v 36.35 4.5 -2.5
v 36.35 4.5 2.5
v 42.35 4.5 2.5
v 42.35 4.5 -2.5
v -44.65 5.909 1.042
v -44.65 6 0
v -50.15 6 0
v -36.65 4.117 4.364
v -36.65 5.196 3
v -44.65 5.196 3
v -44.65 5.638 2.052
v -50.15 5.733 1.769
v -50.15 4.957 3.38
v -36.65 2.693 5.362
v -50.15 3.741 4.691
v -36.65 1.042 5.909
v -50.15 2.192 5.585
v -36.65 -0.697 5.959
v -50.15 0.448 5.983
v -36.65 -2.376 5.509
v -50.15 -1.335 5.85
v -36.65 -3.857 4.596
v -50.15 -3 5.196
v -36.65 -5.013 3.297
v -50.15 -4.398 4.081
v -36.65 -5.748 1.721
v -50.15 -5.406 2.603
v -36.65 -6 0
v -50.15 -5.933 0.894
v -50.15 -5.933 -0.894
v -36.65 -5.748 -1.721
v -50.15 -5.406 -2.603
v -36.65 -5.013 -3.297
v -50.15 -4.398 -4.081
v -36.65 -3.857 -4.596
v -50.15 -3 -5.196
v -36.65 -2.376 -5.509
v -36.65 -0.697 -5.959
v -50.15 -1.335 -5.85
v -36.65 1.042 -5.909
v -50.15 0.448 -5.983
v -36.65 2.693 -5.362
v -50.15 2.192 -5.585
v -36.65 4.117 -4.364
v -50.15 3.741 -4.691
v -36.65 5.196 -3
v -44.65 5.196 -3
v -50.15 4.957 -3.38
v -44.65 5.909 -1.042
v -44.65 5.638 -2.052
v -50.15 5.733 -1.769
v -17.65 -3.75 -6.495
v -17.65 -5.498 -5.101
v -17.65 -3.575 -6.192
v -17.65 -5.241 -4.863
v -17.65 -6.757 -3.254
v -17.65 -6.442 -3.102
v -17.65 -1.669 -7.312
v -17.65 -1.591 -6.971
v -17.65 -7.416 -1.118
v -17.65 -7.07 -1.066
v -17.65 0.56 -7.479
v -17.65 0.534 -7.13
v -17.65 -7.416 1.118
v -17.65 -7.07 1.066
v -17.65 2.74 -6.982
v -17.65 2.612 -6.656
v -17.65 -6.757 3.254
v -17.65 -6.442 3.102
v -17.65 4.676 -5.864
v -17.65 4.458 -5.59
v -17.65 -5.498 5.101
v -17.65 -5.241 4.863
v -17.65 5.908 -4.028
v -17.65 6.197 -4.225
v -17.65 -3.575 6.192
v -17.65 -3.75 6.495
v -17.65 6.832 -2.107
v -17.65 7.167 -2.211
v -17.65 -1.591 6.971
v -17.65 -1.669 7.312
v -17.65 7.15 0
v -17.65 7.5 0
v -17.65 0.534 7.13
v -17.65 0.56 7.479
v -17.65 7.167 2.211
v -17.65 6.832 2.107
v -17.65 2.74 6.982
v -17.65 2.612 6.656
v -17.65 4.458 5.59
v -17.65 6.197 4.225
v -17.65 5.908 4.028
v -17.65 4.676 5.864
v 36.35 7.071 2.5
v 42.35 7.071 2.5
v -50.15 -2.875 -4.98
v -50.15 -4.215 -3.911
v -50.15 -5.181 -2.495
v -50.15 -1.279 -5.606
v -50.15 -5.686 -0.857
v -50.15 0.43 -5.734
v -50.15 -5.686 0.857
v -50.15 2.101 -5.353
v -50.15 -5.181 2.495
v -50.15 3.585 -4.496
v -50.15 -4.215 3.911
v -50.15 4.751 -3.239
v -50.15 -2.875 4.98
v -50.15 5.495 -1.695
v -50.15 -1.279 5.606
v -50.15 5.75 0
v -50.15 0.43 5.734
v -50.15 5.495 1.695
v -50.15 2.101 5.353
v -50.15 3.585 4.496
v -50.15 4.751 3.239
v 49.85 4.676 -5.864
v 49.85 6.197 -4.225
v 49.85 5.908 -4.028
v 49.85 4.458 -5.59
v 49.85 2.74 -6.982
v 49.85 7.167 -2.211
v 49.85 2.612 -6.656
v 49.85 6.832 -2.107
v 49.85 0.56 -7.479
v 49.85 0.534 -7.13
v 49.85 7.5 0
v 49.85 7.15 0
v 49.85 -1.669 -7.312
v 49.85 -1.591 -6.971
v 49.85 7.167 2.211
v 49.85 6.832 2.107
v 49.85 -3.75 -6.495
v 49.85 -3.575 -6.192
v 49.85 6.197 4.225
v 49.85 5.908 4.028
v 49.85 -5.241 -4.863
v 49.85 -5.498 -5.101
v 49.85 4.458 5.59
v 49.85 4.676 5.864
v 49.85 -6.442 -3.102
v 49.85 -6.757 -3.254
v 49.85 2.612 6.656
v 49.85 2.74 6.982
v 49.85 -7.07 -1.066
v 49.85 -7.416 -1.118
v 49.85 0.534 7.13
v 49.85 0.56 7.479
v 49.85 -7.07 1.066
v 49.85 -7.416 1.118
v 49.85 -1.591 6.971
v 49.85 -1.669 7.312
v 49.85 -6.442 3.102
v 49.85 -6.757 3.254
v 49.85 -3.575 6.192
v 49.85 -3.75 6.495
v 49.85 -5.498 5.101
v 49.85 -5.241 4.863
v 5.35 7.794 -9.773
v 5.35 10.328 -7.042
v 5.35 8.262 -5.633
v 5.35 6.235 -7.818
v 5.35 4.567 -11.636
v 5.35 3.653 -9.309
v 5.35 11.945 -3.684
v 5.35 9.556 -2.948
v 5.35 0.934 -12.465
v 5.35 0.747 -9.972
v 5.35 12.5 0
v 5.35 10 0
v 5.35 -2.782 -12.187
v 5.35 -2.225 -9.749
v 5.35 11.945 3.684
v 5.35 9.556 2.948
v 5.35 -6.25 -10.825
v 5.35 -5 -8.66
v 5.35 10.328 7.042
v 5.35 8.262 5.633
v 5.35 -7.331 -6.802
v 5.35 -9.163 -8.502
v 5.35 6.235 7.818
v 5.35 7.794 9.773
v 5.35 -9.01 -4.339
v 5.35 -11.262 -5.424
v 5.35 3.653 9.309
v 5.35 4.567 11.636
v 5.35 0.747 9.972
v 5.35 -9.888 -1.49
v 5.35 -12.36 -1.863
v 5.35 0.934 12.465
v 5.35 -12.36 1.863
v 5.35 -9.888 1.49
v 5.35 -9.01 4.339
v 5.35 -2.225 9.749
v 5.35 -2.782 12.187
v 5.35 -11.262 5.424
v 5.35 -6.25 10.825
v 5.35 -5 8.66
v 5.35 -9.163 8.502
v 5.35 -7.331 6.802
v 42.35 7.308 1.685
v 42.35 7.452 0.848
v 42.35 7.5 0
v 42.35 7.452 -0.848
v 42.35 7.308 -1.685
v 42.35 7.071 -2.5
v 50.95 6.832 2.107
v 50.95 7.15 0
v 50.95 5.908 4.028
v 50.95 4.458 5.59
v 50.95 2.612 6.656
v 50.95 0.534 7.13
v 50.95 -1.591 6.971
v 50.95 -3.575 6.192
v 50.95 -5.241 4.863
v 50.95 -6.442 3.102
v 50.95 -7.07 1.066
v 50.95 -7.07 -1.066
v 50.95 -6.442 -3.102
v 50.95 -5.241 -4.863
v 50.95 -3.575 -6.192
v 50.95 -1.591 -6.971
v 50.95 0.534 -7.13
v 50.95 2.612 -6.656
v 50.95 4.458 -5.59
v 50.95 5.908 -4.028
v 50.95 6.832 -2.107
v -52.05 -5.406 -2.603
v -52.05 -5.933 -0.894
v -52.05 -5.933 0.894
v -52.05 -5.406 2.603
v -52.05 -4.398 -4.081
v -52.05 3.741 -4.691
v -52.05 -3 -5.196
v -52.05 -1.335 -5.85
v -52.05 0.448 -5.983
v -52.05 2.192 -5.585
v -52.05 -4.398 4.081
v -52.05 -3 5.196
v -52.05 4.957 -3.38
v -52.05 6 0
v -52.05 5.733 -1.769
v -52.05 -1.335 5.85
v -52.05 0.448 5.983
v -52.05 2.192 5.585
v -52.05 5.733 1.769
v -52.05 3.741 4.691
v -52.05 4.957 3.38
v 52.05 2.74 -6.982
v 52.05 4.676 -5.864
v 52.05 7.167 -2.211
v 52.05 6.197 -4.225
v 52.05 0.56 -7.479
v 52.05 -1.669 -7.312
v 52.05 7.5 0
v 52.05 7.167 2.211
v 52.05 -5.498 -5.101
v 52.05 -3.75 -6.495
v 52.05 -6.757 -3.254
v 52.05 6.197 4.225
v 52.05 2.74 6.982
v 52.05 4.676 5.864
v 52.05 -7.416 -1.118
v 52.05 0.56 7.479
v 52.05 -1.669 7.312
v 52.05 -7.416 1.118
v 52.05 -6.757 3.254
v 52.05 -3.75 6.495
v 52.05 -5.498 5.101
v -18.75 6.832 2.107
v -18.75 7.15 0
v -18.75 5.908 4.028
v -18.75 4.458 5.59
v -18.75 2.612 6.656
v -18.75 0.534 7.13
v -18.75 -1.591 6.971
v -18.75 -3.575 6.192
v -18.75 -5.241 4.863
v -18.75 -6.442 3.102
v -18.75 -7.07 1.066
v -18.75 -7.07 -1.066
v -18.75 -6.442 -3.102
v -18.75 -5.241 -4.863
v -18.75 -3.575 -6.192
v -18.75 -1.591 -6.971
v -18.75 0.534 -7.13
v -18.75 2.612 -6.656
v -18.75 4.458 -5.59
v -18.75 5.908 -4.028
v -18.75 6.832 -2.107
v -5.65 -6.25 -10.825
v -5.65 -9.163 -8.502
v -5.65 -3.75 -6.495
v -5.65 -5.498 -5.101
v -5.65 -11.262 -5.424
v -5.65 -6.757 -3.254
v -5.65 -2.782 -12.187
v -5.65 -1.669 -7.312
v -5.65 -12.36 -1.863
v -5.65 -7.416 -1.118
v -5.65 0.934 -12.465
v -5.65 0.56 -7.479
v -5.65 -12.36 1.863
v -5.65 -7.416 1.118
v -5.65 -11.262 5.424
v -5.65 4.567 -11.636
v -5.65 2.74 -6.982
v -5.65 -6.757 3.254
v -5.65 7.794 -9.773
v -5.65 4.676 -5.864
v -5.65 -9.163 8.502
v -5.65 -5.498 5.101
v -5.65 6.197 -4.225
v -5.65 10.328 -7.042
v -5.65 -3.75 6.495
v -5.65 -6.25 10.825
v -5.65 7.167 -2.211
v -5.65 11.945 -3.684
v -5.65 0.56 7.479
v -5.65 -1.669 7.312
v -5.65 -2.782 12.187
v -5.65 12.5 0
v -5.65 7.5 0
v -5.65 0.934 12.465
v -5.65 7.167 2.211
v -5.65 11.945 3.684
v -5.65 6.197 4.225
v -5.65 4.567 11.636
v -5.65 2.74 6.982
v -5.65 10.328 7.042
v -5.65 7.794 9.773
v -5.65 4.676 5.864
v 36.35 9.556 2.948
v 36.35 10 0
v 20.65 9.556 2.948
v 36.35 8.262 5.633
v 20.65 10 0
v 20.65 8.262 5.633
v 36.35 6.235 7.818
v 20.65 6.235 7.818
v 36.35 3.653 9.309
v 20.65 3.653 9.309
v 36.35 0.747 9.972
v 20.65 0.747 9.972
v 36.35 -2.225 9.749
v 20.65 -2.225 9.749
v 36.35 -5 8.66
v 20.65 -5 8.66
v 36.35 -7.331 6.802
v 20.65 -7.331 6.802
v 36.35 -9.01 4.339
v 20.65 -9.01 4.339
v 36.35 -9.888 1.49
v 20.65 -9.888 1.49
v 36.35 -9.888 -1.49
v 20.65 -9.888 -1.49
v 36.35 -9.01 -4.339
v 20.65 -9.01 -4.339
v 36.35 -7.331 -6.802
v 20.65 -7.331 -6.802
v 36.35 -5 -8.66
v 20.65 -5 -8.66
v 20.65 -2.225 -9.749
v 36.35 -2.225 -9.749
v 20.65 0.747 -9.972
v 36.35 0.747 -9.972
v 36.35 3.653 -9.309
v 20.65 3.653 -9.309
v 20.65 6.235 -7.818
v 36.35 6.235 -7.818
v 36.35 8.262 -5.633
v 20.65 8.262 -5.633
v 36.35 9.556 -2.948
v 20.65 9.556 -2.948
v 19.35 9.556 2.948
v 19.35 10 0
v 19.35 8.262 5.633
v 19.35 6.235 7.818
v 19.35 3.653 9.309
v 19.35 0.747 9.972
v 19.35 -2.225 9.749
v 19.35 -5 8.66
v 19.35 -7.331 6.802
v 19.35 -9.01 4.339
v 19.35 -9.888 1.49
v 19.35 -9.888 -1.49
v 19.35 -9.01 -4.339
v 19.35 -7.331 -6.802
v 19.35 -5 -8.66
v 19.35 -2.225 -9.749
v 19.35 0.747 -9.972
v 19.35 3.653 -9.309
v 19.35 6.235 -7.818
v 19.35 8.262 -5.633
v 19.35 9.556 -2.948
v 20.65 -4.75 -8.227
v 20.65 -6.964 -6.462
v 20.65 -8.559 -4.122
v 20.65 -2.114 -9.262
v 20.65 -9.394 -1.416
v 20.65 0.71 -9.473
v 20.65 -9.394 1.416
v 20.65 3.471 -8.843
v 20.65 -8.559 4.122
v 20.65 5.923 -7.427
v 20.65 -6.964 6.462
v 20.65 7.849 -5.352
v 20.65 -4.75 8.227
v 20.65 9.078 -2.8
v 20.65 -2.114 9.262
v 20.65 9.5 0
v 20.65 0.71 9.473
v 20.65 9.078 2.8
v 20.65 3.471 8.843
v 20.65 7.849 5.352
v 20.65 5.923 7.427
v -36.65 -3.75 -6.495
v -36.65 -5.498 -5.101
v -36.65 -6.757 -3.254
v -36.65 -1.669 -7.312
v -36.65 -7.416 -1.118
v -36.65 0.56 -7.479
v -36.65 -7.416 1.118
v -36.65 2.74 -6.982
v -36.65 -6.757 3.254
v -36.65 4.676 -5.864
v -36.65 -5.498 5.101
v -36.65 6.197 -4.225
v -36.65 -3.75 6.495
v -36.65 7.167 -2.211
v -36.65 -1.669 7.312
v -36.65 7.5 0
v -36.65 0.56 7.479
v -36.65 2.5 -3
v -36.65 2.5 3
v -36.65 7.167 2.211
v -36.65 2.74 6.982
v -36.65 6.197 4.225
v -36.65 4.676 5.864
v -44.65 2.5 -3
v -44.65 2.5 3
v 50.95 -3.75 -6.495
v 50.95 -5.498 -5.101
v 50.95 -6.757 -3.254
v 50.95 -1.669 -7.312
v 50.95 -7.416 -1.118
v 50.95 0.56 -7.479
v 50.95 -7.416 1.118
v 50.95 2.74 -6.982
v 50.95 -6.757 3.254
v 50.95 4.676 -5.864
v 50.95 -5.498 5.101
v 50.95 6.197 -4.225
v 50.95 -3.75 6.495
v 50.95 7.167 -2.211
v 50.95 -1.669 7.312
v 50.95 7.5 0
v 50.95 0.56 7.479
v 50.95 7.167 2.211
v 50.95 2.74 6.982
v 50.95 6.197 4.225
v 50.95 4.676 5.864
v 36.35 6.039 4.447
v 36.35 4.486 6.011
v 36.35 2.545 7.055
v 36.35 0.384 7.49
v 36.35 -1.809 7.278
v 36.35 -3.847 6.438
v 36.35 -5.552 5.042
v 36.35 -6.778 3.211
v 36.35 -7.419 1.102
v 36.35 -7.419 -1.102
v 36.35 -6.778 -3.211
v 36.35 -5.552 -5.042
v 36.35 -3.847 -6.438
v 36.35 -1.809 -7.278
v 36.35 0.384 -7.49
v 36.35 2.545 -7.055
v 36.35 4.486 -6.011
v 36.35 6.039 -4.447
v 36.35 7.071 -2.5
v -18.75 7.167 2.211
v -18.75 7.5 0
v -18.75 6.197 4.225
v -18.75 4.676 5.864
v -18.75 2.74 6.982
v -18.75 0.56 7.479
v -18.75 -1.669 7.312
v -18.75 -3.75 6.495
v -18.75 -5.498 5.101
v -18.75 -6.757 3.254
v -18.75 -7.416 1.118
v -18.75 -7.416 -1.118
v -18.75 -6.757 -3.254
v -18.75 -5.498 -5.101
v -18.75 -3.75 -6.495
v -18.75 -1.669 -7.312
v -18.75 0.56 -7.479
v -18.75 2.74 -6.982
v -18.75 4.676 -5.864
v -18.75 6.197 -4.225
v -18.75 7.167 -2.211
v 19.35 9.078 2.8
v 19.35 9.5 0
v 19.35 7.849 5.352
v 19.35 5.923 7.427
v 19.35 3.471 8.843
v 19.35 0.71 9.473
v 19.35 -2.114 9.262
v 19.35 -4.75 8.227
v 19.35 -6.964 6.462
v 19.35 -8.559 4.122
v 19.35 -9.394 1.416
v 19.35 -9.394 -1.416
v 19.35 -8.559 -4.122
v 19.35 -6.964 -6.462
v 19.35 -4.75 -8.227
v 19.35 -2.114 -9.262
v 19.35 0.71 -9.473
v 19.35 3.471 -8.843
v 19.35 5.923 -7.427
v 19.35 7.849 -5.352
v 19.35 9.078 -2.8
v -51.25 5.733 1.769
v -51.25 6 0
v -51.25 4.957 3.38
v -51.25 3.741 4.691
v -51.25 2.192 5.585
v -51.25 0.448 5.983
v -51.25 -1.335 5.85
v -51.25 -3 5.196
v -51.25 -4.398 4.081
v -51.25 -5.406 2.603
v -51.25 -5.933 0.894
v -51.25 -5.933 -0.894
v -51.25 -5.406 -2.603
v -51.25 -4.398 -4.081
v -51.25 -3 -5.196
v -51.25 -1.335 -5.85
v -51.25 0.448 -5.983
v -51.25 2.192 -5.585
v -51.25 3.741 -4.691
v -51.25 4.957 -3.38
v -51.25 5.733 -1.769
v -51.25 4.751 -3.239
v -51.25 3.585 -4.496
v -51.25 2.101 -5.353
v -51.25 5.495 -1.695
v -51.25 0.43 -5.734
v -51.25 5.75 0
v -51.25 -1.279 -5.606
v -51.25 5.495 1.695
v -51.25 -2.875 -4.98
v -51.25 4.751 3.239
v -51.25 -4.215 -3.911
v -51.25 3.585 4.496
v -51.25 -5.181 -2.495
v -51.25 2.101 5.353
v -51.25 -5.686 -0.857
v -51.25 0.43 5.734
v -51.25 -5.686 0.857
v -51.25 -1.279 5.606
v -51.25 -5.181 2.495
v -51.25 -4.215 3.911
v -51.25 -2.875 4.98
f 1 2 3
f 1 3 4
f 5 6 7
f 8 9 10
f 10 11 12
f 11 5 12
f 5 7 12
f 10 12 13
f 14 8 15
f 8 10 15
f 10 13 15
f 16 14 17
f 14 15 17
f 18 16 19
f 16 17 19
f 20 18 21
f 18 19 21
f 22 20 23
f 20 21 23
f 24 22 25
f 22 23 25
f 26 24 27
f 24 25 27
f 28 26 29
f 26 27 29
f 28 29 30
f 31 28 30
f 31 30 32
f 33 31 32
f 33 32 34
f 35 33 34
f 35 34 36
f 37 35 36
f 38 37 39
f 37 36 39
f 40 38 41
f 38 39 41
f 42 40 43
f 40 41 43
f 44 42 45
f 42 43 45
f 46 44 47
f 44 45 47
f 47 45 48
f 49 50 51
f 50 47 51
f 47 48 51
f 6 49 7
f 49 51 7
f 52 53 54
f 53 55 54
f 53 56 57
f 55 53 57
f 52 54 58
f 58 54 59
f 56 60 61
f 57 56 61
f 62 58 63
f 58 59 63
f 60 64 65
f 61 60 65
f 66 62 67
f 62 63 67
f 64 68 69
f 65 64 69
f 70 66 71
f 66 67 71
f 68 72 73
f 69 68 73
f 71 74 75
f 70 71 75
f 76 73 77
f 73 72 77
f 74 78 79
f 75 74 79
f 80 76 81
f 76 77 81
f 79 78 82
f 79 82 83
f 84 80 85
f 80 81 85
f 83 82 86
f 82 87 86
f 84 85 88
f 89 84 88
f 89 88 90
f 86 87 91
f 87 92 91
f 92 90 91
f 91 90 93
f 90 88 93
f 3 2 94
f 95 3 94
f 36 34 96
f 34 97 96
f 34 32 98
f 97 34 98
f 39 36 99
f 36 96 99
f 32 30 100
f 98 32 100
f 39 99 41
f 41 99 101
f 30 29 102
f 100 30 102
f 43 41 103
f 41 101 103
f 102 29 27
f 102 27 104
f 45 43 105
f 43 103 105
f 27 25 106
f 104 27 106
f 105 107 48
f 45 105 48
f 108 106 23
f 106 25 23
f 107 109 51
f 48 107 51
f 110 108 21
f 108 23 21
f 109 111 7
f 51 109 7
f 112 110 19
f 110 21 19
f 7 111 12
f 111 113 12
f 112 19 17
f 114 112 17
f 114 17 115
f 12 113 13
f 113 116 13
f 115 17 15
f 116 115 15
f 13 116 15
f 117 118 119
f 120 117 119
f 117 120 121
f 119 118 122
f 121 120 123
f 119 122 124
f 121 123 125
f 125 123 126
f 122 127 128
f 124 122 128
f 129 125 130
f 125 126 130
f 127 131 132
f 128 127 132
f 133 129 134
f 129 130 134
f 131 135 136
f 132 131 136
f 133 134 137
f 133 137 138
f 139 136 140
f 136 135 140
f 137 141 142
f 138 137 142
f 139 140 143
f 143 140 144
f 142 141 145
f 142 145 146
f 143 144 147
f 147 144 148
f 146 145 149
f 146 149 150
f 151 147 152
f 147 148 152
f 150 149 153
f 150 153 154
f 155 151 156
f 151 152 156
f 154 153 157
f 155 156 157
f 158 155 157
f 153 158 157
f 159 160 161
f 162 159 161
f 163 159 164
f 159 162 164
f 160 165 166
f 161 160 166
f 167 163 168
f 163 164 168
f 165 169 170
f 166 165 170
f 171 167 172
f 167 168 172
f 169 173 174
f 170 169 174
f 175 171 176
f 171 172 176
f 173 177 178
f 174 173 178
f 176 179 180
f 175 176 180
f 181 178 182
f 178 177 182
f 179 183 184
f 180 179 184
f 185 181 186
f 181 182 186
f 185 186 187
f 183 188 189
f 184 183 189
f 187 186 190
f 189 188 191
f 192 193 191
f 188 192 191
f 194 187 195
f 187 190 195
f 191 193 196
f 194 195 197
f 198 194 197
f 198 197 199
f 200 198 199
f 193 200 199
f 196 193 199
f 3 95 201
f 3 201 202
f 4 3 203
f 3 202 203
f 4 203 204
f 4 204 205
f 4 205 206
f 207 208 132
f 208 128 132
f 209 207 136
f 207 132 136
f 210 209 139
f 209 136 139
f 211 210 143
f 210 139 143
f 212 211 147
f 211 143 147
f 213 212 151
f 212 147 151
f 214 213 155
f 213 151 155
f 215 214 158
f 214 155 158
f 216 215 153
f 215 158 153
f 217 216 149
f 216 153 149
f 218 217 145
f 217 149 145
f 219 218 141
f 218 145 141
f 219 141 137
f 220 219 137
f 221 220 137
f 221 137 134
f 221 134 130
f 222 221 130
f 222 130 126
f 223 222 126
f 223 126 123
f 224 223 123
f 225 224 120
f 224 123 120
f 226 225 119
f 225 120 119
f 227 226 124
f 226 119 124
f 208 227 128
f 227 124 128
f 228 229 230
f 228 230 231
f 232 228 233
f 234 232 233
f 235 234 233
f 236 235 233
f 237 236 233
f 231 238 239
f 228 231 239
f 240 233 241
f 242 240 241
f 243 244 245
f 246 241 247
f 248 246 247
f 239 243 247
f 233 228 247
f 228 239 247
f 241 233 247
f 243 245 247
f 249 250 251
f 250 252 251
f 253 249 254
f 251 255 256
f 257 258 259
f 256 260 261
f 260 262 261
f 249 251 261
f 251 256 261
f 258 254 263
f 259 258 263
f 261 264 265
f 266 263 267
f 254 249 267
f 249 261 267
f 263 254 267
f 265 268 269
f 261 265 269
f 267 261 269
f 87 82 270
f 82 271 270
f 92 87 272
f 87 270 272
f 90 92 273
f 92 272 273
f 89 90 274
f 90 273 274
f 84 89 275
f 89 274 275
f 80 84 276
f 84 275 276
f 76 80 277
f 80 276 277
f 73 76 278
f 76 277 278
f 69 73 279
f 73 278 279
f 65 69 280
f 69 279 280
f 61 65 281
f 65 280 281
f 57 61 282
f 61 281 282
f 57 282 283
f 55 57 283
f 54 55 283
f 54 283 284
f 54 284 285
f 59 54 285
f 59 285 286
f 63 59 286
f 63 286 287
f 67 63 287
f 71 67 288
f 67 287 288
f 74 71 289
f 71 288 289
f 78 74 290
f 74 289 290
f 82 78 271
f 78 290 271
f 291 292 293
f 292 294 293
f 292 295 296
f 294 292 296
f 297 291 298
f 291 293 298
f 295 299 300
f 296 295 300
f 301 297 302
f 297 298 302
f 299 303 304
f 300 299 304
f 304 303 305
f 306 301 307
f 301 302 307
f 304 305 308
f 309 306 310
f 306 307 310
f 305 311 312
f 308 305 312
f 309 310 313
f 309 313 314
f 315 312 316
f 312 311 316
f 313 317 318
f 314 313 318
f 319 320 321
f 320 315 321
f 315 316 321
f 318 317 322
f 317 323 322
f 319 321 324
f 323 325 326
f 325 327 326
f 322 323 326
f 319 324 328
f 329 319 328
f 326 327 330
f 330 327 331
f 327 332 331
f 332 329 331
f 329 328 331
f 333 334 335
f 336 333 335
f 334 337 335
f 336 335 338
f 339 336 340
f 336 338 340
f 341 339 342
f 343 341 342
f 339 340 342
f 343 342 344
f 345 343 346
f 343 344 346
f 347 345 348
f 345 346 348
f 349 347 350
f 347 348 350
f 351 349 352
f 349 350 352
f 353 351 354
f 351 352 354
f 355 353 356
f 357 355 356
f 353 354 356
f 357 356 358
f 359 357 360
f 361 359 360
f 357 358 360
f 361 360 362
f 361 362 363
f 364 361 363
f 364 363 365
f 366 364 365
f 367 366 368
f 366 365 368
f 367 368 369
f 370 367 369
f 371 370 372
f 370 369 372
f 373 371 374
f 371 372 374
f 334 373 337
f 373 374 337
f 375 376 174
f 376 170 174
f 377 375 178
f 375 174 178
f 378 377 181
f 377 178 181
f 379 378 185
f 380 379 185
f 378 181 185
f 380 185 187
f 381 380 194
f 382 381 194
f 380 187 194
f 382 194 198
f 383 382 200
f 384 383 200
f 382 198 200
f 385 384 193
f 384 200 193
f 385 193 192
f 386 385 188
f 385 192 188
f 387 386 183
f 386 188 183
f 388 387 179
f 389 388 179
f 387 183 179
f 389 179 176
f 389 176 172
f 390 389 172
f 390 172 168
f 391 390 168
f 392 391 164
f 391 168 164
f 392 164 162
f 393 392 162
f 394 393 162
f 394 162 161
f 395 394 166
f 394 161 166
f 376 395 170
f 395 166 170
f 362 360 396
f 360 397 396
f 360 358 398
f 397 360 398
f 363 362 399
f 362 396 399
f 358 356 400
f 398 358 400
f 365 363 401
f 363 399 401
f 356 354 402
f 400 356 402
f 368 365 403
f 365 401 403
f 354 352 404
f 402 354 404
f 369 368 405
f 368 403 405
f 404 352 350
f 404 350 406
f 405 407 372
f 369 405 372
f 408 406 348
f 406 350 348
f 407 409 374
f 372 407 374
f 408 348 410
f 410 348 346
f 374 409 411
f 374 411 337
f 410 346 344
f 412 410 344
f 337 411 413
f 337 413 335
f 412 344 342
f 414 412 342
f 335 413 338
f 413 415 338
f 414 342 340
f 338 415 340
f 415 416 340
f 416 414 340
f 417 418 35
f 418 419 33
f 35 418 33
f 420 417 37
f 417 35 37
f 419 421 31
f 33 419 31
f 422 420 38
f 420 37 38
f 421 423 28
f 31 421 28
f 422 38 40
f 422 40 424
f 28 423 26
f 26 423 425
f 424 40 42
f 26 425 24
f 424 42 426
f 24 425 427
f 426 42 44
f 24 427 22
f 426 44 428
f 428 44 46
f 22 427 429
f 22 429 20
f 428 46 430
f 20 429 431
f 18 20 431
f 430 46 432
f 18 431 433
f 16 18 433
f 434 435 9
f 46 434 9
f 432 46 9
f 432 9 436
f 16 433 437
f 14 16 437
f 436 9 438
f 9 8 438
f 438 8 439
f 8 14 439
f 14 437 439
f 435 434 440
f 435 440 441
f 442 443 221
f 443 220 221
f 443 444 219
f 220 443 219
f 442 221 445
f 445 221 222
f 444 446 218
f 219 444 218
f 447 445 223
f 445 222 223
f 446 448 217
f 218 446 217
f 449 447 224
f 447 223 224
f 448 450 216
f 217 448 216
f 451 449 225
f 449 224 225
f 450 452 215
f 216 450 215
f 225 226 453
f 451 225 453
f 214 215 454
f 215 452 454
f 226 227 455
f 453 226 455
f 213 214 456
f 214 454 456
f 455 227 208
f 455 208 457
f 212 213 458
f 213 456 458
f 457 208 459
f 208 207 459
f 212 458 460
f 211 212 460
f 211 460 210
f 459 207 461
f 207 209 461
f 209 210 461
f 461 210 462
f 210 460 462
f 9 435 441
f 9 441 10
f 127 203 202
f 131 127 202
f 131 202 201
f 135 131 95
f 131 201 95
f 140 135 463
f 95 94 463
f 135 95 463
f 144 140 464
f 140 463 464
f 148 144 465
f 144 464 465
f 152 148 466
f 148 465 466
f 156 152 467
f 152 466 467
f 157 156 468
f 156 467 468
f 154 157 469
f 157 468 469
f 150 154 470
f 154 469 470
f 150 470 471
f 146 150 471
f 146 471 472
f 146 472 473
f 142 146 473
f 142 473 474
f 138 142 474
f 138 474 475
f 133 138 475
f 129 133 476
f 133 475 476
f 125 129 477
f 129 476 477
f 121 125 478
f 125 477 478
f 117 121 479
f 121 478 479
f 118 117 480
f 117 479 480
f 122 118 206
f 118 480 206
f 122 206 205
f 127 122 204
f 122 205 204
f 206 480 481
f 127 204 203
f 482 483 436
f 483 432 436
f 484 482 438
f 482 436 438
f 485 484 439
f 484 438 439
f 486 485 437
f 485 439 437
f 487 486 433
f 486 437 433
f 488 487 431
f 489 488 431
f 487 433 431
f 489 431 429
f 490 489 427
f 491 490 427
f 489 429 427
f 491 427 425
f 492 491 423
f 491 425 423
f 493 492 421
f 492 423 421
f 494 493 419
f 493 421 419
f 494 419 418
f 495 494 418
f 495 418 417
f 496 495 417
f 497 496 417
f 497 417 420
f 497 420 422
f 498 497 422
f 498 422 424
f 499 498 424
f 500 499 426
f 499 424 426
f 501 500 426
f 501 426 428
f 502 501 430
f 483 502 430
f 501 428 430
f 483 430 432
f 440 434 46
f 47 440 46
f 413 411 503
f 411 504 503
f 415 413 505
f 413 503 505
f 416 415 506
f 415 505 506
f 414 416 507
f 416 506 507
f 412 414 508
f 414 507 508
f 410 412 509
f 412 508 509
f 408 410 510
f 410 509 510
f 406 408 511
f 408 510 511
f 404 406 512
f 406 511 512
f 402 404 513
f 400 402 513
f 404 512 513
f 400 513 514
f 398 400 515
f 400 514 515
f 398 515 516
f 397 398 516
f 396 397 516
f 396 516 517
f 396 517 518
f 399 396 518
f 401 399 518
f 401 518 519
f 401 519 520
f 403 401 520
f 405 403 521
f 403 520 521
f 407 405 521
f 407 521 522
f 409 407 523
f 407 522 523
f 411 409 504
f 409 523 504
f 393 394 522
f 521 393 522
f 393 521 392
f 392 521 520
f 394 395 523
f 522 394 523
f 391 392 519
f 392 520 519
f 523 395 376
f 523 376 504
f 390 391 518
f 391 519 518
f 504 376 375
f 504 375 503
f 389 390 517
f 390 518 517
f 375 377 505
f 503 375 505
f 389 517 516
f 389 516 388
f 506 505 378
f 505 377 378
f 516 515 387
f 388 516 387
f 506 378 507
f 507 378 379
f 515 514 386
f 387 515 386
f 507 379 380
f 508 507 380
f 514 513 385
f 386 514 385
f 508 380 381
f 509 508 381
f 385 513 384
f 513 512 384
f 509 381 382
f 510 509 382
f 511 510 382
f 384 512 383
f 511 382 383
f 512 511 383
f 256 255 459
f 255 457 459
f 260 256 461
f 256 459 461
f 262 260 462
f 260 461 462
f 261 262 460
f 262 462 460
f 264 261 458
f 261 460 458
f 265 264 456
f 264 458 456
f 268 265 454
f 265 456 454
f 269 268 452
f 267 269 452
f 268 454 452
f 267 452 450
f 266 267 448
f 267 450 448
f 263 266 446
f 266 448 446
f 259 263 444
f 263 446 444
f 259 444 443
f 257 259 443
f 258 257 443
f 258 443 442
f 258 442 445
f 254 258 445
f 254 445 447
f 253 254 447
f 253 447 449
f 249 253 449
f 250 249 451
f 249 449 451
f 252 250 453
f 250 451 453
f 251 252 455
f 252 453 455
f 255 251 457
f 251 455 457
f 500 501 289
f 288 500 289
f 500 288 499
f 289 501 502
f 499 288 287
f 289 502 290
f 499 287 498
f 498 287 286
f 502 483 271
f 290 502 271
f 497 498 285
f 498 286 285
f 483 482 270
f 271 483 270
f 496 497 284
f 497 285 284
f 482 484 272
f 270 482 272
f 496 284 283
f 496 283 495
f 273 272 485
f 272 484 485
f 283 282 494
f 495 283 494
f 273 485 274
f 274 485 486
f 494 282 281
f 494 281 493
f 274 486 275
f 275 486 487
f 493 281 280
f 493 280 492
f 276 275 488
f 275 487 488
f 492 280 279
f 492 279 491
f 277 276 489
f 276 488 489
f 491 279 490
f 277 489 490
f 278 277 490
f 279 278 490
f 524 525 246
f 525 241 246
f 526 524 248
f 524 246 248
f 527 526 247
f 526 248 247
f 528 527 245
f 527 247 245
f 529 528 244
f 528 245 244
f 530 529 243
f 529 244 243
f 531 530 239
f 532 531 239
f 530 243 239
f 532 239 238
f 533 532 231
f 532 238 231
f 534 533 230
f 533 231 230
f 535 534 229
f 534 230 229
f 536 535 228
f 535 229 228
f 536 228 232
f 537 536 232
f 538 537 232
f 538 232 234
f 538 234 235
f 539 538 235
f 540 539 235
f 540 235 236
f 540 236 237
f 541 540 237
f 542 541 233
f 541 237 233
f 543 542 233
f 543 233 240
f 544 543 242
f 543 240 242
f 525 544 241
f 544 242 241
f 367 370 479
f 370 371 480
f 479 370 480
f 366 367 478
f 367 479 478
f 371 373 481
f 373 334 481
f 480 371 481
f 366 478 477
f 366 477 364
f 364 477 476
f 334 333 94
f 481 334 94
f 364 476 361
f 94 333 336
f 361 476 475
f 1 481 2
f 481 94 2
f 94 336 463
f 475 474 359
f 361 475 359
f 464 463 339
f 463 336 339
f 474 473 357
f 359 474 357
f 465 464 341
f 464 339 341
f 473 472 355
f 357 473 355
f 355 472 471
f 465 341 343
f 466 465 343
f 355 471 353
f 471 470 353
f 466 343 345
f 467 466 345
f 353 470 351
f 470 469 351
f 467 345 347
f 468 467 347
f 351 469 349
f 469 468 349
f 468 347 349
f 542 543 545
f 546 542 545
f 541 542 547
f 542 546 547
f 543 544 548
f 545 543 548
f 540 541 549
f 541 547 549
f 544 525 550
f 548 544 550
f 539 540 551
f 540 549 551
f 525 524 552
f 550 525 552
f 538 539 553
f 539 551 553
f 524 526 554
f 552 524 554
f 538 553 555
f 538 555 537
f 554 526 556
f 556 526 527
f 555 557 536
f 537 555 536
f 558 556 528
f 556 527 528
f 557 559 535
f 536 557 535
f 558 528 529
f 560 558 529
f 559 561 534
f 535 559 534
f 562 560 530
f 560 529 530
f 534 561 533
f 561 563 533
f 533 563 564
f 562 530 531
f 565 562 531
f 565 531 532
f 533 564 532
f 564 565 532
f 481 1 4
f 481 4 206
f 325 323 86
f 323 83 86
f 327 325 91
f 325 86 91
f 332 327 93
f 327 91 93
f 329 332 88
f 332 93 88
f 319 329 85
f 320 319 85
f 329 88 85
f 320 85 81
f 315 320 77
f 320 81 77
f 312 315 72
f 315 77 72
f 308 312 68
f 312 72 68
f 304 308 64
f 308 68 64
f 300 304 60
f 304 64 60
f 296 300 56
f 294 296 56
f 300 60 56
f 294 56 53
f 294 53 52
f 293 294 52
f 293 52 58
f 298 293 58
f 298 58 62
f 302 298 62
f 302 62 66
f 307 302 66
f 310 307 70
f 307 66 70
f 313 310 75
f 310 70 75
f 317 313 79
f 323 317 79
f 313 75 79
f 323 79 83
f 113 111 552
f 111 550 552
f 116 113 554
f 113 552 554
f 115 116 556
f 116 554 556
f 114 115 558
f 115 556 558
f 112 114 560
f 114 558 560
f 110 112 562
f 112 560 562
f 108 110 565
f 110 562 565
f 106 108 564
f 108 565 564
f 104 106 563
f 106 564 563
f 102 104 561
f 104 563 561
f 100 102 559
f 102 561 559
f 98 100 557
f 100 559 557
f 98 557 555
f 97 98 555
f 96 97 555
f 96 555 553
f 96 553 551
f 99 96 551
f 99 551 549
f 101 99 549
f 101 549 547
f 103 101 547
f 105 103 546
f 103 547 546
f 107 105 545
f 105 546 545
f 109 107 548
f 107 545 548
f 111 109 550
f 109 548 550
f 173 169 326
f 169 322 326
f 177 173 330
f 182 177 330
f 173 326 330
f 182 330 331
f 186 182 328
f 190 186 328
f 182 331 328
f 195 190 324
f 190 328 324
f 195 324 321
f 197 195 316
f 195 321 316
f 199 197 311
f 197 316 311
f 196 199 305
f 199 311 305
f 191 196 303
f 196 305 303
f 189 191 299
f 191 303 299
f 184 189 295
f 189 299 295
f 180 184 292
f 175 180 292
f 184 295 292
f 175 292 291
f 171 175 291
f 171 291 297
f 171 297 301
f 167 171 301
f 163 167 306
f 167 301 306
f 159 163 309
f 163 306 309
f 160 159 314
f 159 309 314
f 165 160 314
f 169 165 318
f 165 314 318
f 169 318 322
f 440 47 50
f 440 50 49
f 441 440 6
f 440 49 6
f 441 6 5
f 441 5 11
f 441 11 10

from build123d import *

# Parameters (mm, degrees)
SKETCH3_W          = 6
SKETCH3_H          = 3.5
CUT_EXTRUDE1_DEPTH = 8
SKETCH4_W          = 5
SKETCH4_H          = 3
CUT_EXTRUDE3_DEPTH = 6


with BuildPart() as part:
    # Sketch1 → Revolve1 (revolve)
    with BuildSketch(Plane.XY):
        Polygon((-52.05, 0), (52.05, 0), (52.05, 7.5), (50.95, 7.5), (50.95, 7.15), (49.85, 7.15), (49.85, 7.5), (36.35, 7.5), (36.35, 10), (20.65, 10), (20.65, 9.5), (19.35, 9.5), (19.35, 10), (5.35, 10), (5.35, 12.5), (-5.65, 12.5), (-5.65, 7.5), (-17.65, 7.5), (-17.65, 7.15), (-18.75, 7.15), (-18.75, 7.5), (-36.65, 7.5), (-36.65, 6), (-50.15, 6), (-50.15, 5.75), (-51.25, 5.75), (-51.25, 6), (-52.05, 6), align=None)
    revolve(axis=Axis((-52.05, 0, 0), (1, 0, 0)))

    # Sketch3 → Cut-Extrude1 (cut)
    with BuildSketch(Plane.ZY.offset(36.65)):
        with Locations((0, 4.25)):
            Rectangle(SKETCH3_W, SKETCH3_H)
    extrude(amount=CUT_EXTRUDE1_DEPTH, mode=Mode.SUBTRACT)

    # Sketch4 → Cut-Extrude3 (cut)
    with BuildSketch(Plane(origin=(36.35, 0, 0), x_dir=(0, 0, -1), z_dir=(1, 0, 0))):
        with Locations((0, 6)):
            Rectangle(SKETCH4_W, SKETCH4_H)
    extrude(amount=CUT_EXTRUDE3_DEPTH, mode=Mode.SUBTRACT)


solid = part.part
